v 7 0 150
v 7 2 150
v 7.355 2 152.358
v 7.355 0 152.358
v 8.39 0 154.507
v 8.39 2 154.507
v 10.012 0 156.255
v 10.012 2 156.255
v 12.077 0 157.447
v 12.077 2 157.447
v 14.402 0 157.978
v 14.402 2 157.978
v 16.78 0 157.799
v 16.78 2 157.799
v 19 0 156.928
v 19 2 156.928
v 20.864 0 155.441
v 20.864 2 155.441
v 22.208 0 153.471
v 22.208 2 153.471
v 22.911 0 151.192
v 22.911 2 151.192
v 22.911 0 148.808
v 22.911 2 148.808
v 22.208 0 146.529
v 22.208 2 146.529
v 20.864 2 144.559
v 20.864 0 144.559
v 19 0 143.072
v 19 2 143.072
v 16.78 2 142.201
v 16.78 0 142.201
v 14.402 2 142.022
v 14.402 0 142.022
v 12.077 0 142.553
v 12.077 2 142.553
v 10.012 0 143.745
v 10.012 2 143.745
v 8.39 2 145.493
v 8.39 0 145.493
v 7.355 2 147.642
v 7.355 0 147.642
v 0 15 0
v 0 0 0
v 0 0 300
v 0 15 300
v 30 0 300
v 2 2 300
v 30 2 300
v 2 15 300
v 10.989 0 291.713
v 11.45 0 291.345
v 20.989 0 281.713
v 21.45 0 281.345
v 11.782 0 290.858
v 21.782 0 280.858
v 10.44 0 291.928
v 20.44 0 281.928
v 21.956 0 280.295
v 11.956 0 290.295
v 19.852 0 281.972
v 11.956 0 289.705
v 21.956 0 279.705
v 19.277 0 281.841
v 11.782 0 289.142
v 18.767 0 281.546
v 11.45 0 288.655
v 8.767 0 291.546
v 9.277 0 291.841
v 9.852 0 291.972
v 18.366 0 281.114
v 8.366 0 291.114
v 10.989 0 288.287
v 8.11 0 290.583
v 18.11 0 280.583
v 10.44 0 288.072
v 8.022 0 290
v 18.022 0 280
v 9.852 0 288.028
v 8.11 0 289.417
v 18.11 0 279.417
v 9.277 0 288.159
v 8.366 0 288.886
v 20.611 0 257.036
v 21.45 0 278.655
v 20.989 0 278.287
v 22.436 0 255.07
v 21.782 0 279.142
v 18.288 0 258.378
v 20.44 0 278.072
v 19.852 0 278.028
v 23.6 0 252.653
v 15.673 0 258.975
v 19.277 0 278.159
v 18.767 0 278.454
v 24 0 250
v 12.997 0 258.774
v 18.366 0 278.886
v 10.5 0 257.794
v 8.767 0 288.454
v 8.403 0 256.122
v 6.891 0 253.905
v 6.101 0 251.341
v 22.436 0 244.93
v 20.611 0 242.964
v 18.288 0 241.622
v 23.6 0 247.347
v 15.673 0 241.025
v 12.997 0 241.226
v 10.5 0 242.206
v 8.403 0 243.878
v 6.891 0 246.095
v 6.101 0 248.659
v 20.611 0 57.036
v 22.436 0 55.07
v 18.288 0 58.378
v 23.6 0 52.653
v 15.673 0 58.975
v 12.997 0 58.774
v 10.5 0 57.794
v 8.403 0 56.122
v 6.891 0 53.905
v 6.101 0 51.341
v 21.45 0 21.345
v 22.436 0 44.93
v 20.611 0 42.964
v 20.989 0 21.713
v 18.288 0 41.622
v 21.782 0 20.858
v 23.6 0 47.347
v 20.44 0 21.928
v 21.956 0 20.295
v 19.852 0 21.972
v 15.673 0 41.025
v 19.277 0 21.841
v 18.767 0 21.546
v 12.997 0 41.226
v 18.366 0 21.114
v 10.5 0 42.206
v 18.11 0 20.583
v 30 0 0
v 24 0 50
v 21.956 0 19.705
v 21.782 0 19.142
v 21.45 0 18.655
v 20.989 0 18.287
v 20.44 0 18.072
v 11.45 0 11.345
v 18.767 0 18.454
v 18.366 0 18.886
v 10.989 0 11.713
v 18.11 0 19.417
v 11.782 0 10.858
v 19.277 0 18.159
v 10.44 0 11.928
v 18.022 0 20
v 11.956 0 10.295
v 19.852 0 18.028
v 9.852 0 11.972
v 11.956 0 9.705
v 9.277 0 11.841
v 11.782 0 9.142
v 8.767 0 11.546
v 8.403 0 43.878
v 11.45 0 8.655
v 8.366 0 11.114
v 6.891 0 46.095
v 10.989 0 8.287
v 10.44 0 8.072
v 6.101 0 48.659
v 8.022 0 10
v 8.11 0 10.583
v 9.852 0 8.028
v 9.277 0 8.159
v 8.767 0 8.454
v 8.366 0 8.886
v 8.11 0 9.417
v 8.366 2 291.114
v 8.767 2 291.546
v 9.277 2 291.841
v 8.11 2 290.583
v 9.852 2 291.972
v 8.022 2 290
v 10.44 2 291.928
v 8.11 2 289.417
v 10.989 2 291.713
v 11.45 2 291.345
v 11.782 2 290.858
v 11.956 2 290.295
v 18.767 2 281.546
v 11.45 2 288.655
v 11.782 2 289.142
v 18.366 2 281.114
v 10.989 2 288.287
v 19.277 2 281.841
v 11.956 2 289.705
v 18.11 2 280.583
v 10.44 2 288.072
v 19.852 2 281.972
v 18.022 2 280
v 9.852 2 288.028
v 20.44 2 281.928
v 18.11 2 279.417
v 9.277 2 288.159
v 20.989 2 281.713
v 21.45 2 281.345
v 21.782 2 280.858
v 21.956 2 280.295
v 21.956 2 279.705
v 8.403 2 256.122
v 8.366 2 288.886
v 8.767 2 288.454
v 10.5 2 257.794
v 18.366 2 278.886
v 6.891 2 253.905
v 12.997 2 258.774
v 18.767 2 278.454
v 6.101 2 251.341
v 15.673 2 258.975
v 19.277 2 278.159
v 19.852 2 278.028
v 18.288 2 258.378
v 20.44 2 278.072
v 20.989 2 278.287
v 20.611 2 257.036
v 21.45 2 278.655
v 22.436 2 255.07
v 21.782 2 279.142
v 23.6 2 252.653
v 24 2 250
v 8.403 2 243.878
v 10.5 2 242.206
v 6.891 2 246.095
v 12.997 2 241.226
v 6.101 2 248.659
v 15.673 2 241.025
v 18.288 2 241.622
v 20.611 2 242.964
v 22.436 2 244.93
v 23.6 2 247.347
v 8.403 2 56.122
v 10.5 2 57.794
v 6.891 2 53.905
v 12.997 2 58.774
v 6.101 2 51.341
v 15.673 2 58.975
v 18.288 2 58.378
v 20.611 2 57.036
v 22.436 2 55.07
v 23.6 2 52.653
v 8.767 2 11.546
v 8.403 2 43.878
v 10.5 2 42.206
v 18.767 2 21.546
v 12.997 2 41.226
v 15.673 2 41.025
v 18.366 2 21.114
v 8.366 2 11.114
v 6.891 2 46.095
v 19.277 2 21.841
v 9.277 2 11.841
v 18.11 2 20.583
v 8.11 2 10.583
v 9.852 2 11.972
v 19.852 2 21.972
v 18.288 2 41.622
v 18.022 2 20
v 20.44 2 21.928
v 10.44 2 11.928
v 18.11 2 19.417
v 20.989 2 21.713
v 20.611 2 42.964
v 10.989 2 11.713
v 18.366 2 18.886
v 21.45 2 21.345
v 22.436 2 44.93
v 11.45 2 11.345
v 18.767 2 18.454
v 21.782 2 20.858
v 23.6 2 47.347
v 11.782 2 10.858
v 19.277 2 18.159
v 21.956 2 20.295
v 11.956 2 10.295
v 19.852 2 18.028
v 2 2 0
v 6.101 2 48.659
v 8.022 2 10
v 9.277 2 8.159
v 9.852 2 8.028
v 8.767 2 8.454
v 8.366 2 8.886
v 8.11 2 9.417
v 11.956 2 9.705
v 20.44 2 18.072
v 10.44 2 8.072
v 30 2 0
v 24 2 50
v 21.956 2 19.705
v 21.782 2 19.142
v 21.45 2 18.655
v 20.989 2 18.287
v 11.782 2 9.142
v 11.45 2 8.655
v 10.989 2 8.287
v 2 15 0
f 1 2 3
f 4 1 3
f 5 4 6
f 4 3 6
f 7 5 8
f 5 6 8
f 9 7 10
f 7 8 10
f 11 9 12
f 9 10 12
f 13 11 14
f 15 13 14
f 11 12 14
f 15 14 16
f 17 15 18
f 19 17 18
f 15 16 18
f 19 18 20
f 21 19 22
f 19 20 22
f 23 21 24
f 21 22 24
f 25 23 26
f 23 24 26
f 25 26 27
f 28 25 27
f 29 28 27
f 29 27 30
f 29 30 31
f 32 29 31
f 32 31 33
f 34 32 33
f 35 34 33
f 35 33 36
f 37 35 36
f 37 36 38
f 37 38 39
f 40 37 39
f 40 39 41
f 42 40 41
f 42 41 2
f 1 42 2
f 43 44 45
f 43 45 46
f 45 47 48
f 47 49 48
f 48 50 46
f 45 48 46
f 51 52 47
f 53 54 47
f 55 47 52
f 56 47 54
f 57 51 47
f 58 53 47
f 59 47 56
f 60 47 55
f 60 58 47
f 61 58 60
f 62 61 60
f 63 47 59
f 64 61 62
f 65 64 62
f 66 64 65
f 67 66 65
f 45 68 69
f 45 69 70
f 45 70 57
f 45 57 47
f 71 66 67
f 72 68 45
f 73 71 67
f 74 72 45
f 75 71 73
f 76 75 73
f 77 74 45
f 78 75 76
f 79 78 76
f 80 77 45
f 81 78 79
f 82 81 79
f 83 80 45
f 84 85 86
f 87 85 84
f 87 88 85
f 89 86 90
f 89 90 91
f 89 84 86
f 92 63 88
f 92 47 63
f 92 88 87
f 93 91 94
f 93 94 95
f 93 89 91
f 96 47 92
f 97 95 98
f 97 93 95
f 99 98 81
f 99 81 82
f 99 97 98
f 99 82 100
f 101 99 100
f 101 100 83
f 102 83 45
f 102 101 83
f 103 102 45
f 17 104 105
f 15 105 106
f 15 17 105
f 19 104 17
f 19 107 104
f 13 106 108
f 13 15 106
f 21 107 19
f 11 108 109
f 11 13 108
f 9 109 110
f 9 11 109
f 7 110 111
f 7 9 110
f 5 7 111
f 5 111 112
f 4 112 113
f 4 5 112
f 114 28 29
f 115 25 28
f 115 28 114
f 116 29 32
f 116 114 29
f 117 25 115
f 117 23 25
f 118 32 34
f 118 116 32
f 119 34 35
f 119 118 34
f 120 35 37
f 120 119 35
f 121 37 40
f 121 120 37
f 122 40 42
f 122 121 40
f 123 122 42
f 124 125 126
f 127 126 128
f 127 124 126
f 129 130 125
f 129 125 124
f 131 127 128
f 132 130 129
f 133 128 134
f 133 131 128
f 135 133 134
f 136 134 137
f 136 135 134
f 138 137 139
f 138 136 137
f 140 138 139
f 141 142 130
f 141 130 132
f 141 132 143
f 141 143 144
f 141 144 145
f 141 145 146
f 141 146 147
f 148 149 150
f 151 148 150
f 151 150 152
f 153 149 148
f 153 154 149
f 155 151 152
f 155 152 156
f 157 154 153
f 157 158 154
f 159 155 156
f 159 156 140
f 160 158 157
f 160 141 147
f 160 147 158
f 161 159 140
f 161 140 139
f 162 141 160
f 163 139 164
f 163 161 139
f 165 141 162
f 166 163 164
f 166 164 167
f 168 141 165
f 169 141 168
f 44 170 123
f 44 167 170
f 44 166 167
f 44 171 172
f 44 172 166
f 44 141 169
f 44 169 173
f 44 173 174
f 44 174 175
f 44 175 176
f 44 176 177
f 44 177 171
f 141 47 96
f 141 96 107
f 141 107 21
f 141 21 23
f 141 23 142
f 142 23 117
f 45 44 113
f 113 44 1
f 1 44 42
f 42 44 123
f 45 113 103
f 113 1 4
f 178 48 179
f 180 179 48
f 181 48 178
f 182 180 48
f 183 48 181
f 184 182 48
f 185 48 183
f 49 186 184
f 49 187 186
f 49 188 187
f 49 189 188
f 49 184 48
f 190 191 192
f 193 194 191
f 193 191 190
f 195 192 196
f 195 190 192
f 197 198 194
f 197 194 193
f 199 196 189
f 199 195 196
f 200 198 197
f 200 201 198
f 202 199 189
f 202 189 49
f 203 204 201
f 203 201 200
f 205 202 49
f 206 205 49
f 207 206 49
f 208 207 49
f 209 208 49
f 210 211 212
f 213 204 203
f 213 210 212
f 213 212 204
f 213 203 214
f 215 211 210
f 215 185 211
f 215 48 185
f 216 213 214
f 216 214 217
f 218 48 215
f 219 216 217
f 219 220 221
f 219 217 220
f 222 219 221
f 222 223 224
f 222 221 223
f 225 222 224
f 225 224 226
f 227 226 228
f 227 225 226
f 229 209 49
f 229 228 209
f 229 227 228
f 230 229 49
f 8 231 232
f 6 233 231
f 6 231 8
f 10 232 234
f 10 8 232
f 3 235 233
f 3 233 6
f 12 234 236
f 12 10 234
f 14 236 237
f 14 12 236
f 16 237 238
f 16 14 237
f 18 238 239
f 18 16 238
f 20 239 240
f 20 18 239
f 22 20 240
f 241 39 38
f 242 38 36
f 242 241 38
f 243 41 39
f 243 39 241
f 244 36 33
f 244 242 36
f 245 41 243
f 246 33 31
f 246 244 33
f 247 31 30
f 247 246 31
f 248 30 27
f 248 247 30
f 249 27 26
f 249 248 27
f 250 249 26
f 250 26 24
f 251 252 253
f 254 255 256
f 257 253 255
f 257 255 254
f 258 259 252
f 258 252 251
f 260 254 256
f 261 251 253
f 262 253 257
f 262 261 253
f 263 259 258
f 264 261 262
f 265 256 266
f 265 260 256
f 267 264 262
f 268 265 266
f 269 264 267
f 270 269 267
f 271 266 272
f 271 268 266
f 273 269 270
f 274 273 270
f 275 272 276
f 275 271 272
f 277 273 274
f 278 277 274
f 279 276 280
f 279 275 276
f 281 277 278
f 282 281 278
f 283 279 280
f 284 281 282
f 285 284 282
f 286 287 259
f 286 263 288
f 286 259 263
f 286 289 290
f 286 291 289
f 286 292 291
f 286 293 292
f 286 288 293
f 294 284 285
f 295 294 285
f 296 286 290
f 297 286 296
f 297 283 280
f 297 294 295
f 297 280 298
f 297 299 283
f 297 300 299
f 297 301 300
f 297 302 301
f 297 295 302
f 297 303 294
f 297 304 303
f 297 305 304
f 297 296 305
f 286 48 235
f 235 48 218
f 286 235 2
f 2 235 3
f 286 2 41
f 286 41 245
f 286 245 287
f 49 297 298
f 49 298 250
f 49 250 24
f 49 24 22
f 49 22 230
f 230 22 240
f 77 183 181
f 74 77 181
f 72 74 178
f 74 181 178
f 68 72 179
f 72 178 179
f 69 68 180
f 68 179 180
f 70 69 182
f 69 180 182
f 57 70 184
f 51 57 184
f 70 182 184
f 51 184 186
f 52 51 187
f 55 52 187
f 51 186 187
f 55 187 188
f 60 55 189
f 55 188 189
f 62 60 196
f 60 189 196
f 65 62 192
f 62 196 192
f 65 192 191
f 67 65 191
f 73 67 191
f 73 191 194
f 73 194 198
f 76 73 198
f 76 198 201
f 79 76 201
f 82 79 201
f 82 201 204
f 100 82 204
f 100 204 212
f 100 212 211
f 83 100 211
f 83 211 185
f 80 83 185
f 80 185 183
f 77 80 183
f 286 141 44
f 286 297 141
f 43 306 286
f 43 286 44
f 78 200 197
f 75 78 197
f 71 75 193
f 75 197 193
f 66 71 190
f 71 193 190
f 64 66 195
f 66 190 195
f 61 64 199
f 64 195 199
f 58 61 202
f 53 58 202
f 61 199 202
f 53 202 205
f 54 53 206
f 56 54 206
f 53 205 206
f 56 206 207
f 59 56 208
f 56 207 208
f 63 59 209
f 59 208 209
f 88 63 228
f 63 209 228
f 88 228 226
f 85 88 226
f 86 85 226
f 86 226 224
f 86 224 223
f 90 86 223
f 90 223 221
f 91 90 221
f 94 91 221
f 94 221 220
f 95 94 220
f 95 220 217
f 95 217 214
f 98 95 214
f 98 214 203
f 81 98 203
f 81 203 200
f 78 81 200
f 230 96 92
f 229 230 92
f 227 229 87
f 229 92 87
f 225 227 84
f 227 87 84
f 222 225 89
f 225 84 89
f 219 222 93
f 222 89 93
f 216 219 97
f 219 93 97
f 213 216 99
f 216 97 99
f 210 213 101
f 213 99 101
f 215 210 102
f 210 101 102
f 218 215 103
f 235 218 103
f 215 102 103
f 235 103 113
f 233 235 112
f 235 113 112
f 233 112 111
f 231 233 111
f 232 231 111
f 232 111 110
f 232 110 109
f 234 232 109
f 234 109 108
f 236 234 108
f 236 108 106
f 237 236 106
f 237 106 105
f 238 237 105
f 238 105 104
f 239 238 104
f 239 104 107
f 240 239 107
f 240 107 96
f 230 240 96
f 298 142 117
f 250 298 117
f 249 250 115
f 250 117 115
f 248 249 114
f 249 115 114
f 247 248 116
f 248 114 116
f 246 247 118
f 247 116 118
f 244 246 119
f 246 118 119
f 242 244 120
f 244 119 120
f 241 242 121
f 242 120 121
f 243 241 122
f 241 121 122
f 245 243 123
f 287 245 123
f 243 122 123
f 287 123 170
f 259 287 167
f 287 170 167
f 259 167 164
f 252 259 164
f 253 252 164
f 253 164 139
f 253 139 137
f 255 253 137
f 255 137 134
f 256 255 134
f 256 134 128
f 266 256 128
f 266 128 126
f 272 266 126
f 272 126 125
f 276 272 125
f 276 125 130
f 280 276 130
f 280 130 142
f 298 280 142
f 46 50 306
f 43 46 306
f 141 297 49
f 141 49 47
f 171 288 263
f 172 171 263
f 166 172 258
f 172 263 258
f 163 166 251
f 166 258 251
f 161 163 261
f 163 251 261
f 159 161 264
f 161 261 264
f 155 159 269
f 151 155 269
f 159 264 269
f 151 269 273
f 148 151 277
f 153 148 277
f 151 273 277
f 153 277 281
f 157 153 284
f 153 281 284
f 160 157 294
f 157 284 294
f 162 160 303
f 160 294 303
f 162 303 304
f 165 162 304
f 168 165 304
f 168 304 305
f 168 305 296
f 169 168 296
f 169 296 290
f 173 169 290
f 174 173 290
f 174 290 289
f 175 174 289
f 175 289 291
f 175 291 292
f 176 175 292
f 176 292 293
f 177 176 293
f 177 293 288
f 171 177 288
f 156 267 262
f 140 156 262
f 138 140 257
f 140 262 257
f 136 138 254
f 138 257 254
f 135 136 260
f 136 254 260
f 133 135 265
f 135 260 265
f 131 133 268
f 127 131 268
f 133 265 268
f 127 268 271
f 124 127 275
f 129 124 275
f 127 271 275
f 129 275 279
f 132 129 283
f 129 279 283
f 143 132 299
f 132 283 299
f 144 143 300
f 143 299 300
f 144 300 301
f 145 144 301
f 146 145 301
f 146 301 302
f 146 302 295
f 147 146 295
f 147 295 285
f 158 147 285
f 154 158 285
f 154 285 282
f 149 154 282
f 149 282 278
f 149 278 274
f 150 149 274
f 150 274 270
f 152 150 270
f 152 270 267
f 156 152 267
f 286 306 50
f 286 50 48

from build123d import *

# Parameters (mm, degrees)
BOSS_EXTRUDE1_DEPTH = 300
SKETCH2_R           = 8
SKETCH2_R_2         = 1.977693409
CUT_EXTRUDE1_DEPTH  = 10
SKETCH3_W           = 300
SKETCH3_H           = 10
CUT_EXTRUDE2_DEPTH  = 10
SKETCH6_R           = 9
CUT_EXTRUDE5_DEPTH  = 5


with BuildPart() as part:
    # Sketch1 → Boss-Extrude1 (new body)
    with BuildSketch(Plane.XY):
        Polygon((0, 0), (0, 25), (2, 25), (2, 2), (30, 2), (30, 0), align=None)
    extrude(amount=BOSS_EXTRUDE1_DEPTH)

    # Sketch2 → Cut-Extrude1 (cut)
    with BuildSketch(Plane(origin=(0, 2, 0), x_dir=(1, 0, 0), z_dir=(0, 1, 0))):
        with Locations(Location((15, -150, 0), (0, 0, 180))):
            Circle(SKETCH2_R)
        with Locations(Location((10, -10, 0), (0, 0, 180))):
            Circle(SKETCH2_R_2)
        with Locations(Location((20, -20, 0), (0, 0, 180))):
            Circle(SKETCH2_R_2)
        with Locations(Location((10, -290, 0), (0, 0, 180))):
            Circle(SKETCH2_R_2)
        with Locations(Location((20, -280, 0), (0, 0, 180))):
            Circle(SKETCH2_R_2)
    extrude(amount=-CUT_EXTRUDE1_DEPTH, mode=Mode.SUBTRACT)

    # Sketch3 → Cut-Extrude2 (cut)
    with BuildSketch(Plane(origin=(2, 0, 0), x_dir=(0, 0, -1), z_dir=(1, 0, 0))):
        with Locations((-150, 20)):
            Rectangle(SKETCH3_W, SKETCH3_H)
    extrude(amount=-CUT_EXTRUDE2_DEPTH, mode=Mode.SUBTRACT)

    # Sketch6 → Cut-Extrude5 (cut)
    with BuildSketch(Plane.XZ):
        with Locations((15, 250)):
            Circle(SKETCH6_R)
        with Locations((15, 50)):
            Circle(SKETCH6_R)
        with Locations((-238, 50)):
            Circle(SKETCH6_R)
        with Locations((-238, 250)):
            Circle(SKETCH6_R)
    extrude(amount=-CUT_EXTRUDE5_DEPTH, mode=Mode.SUBTRACT)


solid = part.part
